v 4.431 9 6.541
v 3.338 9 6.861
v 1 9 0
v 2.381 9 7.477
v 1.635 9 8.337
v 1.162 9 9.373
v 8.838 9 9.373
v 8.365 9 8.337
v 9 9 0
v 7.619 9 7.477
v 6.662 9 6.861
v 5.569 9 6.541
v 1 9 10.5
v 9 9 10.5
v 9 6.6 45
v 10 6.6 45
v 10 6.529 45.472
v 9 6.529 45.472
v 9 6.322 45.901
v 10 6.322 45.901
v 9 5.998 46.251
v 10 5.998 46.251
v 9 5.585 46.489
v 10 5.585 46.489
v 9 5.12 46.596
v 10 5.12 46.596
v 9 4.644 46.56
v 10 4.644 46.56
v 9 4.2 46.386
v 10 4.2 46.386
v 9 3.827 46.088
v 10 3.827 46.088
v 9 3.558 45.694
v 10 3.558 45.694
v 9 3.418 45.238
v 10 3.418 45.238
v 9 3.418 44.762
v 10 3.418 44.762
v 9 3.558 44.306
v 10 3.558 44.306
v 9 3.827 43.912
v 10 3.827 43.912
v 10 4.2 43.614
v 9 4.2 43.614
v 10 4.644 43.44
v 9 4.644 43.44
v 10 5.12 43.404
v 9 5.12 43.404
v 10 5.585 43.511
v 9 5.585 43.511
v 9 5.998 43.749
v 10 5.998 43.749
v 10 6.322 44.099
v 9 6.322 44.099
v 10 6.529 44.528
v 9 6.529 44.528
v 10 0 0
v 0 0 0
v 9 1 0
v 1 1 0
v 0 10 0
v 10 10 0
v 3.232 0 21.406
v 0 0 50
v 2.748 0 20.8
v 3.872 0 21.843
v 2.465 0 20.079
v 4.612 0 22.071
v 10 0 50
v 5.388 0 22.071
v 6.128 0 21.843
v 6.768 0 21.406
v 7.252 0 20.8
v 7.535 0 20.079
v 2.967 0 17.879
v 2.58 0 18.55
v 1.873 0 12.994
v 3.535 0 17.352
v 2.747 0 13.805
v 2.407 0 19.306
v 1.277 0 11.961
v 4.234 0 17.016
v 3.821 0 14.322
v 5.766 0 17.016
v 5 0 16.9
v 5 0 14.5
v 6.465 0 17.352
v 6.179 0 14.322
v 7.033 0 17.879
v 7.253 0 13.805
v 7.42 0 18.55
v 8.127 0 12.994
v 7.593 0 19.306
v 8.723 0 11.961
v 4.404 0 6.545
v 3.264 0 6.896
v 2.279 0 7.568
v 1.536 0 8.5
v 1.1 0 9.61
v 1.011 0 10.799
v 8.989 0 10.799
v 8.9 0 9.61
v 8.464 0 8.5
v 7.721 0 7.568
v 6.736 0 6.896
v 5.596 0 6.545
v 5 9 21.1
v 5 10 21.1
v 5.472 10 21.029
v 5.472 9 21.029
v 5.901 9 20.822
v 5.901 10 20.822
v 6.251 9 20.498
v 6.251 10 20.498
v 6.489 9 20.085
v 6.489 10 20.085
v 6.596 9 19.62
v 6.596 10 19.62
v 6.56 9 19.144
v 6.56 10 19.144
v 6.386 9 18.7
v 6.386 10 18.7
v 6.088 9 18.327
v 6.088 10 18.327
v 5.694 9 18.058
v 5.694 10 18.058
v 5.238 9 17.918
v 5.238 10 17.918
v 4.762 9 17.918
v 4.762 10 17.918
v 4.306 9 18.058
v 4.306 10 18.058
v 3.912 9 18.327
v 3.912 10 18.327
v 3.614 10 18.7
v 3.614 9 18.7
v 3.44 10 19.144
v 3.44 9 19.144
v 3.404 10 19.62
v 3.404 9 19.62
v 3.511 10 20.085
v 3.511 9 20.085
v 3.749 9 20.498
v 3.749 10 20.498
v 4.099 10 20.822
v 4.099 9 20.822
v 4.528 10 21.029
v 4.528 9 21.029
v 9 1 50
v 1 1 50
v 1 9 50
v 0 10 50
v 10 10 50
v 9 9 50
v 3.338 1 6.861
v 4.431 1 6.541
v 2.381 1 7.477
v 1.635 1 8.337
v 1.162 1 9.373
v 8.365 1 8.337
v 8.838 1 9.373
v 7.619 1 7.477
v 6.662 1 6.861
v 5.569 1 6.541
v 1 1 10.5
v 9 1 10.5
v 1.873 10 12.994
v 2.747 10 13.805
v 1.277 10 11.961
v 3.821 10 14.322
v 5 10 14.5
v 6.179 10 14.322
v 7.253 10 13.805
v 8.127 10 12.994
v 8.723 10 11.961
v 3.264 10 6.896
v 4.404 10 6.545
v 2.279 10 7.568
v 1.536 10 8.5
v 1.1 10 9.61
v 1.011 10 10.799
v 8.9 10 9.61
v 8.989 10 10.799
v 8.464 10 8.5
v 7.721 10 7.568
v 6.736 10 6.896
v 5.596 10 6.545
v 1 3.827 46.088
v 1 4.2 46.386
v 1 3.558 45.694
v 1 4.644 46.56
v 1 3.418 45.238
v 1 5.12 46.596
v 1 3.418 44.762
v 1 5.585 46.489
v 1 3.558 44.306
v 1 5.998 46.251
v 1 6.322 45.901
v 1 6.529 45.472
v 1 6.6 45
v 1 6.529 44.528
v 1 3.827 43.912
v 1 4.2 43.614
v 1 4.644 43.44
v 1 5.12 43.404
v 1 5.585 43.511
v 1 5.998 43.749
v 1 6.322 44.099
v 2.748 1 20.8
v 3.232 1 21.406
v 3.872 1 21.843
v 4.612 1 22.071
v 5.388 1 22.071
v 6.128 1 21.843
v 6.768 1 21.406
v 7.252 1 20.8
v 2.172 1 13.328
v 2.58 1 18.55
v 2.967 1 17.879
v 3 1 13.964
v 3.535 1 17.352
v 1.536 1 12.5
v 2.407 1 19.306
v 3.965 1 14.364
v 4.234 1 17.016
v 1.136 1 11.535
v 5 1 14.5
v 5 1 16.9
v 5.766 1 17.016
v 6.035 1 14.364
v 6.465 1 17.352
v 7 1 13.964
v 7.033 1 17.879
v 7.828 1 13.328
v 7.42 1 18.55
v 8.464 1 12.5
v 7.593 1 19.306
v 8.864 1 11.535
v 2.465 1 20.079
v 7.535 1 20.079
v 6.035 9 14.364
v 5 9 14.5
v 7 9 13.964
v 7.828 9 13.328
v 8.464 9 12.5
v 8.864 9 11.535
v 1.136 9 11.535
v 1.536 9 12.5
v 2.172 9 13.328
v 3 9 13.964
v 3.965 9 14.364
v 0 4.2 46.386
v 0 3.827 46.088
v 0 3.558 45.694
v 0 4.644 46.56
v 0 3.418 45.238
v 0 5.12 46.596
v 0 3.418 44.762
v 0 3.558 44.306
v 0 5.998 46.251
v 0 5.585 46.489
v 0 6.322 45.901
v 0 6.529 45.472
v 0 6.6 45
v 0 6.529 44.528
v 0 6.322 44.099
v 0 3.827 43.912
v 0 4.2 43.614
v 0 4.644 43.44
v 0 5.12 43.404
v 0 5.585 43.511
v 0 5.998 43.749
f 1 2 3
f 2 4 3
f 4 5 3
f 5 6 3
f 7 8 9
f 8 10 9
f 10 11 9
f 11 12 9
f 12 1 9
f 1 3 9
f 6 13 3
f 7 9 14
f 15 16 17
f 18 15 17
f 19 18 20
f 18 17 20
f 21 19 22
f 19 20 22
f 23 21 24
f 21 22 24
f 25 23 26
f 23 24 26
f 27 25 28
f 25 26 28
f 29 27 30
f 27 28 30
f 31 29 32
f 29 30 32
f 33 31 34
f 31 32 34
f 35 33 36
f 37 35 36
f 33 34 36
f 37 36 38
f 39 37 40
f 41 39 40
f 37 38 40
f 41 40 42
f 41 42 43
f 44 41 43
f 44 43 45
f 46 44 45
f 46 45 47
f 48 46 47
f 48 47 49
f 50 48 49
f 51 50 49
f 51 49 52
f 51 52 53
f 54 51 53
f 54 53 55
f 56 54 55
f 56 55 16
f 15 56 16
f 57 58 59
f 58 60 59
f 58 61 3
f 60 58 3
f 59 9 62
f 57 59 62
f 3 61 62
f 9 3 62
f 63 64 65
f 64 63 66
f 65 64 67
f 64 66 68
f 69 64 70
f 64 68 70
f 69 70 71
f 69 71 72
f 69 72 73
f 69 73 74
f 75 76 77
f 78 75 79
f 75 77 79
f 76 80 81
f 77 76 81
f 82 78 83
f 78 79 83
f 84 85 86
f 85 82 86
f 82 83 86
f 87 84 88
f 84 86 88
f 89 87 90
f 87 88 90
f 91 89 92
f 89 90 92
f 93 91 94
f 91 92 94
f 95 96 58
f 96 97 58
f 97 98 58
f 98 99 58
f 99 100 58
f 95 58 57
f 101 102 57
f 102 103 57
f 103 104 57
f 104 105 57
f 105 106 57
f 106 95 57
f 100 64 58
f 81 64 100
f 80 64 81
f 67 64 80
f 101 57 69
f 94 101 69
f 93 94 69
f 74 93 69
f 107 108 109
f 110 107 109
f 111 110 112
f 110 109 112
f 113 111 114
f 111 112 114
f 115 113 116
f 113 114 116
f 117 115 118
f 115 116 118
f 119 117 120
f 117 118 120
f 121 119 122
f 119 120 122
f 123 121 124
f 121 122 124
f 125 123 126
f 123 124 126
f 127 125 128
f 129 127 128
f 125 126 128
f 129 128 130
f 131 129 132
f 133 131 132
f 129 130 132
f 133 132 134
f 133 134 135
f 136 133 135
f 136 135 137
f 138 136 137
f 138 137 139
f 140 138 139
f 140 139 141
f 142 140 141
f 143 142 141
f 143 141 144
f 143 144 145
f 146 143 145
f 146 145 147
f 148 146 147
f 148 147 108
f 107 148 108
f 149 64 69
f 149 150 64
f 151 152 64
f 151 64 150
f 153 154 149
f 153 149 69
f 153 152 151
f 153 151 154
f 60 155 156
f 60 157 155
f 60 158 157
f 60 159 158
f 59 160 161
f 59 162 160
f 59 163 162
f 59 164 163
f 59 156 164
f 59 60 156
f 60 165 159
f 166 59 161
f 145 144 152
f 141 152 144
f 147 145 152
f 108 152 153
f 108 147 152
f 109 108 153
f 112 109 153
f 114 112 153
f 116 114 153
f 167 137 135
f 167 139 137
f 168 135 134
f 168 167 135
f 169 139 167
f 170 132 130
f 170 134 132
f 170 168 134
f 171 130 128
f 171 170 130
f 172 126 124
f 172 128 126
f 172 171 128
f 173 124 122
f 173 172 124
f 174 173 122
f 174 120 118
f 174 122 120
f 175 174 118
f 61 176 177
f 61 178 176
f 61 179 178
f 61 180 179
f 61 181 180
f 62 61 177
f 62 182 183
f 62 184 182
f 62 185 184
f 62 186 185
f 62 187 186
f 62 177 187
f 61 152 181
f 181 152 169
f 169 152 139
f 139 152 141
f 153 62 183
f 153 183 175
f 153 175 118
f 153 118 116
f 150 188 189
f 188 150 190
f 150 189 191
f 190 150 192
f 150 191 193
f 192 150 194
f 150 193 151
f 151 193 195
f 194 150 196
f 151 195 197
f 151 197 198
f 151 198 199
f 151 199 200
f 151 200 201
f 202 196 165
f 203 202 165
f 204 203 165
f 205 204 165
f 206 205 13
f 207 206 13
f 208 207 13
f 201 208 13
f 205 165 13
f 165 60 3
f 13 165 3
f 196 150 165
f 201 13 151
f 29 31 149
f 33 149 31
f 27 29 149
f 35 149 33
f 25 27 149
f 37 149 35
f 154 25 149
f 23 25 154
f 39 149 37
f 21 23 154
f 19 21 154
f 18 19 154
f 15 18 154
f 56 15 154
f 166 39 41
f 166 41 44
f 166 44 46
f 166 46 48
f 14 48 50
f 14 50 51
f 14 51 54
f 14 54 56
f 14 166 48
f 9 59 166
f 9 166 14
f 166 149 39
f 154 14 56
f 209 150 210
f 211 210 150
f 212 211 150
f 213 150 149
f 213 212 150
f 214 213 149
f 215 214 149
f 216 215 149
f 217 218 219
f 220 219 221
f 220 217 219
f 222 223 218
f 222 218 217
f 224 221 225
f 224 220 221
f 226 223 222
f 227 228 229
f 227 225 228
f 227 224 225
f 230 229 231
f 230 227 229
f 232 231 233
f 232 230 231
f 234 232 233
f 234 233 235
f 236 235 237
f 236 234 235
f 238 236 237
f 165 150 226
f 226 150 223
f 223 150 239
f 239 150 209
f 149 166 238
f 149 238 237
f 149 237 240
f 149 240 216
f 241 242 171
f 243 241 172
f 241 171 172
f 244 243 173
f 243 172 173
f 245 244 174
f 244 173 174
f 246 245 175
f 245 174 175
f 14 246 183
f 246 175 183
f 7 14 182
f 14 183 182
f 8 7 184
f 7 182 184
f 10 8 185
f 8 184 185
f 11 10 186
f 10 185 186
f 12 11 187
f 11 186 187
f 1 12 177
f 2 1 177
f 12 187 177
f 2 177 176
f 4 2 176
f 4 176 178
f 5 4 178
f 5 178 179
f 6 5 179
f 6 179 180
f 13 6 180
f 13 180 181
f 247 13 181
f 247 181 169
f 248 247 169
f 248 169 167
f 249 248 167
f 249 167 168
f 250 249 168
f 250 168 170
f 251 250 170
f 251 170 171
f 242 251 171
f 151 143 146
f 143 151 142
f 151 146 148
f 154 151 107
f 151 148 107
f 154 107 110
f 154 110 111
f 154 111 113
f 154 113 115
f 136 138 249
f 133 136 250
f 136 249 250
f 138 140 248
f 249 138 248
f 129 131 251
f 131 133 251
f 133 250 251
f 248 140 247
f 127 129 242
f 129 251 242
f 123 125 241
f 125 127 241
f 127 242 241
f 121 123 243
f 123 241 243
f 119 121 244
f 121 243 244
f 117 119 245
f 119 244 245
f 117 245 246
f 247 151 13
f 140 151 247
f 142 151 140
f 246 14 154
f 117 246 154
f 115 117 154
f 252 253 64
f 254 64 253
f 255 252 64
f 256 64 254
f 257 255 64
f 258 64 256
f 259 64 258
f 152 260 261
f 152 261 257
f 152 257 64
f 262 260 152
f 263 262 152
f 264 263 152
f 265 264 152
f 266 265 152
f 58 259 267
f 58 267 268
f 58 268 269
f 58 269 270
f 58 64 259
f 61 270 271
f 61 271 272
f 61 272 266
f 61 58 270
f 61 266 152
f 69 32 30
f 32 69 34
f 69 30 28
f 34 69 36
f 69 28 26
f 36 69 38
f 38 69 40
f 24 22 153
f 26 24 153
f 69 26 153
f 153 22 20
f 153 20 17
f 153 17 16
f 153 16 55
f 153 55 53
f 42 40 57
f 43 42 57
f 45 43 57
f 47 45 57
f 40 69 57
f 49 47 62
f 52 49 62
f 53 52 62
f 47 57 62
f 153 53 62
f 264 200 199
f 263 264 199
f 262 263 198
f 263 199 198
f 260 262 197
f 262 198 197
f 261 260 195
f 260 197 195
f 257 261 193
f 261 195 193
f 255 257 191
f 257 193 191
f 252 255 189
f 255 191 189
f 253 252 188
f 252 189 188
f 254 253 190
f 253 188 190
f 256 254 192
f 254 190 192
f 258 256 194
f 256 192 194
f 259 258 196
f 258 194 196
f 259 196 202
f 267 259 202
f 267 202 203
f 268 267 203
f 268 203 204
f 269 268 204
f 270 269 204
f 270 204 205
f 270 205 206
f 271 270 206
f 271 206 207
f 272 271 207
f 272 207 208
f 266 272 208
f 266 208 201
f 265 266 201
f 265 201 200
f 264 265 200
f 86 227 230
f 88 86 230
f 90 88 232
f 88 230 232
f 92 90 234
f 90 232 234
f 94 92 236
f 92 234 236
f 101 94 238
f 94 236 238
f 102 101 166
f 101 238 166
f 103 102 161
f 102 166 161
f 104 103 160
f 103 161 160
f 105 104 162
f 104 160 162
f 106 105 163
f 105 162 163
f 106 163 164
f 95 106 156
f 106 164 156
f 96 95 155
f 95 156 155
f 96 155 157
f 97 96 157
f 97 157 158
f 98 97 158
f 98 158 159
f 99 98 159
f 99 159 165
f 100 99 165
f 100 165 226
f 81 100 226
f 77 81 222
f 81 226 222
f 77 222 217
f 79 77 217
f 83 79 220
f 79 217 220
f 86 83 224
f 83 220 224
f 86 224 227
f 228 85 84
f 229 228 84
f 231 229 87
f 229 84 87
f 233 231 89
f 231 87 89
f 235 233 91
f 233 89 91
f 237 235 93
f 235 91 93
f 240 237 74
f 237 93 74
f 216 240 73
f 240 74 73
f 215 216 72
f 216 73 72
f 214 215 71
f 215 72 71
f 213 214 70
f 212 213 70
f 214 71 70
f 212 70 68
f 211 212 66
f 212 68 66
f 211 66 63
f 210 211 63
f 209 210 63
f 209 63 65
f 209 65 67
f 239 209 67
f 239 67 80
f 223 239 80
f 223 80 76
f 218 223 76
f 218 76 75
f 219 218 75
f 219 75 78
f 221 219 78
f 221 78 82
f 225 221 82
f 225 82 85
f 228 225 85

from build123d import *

# Parameters (mm, degrees)
SKETCH_1_W          = 10
SKETCH_1_H          = 10
SKETCH_1_W_2        = 8
SKETCH_1_H_2        = 8
EXTRUDE_1_DEPTH     = 50
SKETCH_2_R          = 4
SKETCH_2_R_2        = 1.6
CUT_EXTRUDE_1_DEPTH = 52.961524227
CUT_EXTRUDE_2_REACH = 53.962
SKETCH_4_R          = 2.6
SKETCH_5_R          = 1.6
CUT_EXTRUDE_3_DEPTH = 52.961524227


with BuildPart() as part:
    # ｽｹｯﾁ1 → 押し出し-薄板1 (new body)
    with BuildSketch(Plane.XY):
        with Locations((5, 5)):
            Rectangle(SKETCH_1_W, SKETCH_1_H)
        with Locations((5, 5)):
            Rectangle(SKETCH_1_W_2, SKETCH_1_H_2, mode=Mode.SUBTRACT)
    extrude(amount=EXTRUDE_1_DEPTH)

    # ｽｹｯﾁ2 → ｶｯﾄ - 押し出し1 (cut, through all)
    with BuildSketch(Plane(origin=(0, 10, 0), x_dir=(1, 0, 0), z_dir=(0, 1, 0))):
        with Locations(Location((5, -10.5, 0), (0, 0, 270))):
            Circle(SKETCH_2_R)
        with Locations(Location((5, -19.5, 0), (0, 0, 270))):
            Circle(SKETCH_2_R_2)
    extrude(amount=-CUT_EXTRUDE_1_DEPTH, mode=Mode.SUBTRACT)

    # ｽｹｯﾁ4 → ｶｯﾄ - 押し出し2 (cut, up to next)
    with BuildSketch(Plane.XZ, mode=Mode.PRIVATE) as cut_extrude_2_sk1:
        with Locations(Location((5, 19.5, 0), (0, 0, 270))):
            Circle(SKETCH_4_R)
    cut_extrude_2_tool1 = extrude(cut_extrude_2_sk1.sketch, amount=-CUT_EXTRUDE_2_REACH, mode=Mode.PRIVATE) & part.part
    add(cut_extrude_2_tool1.solids().sort_by_distance((5, 0, 19.5))[0], mode=Mode.SUBTRACT)

    # ｽｹｯﾁ5 → ｶｯﾄ - 押し出し3 (cut, through all)
    with BuildSketch(Plane(origin=(10, 0, 0), x_dir=(0, 0, -1), z_dir=(1, 0, 0))):
        with Locations(Location((-45, 5, 0), (0, 0, 90))):
            Circle(SKETCH_5_R)
    extrude(amount=-CUT_EXTRUDE_3_DEPTH, mode=Mode.SUBTRACT)


solid = part.part
